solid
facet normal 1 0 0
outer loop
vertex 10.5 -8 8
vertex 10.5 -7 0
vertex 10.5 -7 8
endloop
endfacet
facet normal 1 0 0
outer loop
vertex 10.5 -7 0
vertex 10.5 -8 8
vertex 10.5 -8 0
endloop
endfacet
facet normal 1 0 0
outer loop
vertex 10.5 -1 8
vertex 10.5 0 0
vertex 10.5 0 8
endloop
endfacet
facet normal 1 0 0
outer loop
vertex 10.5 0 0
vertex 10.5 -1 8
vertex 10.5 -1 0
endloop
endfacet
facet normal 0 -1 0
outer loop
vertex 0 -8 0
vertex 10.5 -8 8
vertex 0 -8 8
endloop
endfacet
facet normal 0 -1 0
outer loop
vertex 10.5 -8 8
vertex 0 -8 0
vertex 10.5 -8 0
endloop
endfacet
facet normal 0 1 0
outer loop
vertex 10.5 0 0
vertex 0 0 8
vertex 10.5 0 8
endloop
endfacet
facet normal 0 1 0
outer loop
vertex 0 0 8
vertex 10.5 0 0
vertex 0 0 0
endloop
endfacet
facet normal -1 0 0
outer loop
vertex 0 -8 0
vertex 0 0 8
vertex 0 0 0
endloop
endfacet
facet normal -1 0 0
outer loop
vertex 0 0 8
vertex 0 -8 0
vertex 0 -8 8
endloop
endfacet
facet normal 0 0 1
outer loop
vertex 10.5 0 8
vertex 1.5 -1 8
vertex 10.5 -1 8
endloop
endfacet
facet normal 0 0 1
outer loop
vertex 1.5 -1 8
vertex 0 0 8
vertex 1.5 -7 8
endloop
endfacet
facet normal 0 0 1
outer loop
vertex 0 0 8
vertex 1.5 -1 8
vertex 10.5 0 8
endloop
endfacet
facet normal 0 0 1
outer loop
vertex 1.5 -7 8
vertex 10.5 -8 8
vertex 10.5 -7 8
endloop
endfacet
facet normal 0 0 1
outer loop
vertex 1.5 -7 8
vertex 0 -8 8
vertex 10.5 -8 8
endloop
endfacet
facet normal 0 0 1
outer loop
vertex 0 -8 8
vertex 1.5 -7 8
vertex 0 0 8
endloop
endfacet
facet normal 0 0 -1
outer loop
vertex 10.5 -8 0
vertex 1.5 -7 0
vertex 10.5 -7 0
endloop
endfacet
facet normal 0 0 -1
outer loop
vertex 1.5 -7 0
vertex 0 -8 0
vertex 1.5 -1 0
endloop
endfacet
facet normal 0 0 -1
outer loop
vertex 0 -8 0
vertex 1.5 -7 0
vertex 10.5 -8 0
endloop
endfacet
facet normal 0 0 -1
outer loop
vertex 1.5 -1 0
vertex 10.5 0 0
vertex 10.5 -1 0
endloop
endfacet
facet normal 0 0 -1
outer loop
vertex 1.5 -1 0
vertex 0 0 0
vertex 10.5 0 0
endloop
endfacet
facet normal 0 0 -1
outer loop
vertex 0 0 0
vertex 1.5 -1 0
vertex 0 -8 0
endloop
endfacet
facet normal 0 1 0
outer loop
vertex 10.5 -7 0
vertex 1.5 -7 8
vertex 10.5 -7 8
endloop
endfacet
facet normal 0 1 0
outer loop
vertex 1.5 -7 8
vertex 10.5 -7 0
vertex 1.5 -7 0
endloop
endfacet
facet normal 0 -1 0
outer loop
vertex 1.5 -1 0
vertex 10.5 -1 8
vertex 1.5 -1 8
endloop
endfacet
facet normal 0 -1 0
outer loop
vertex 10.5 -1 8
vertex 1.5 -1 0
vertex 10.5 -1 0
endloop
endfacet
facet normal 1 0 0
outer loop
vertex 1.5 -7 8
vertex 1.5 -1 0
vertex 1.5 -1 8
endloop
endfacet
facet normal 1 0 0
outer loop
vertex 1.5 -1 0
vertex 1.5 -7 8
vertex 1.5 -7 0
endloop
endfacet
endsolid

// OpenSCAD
rotate([90,0,0]) //causes z and y to switch! because of rotation beware
/*union(){

	difference(){
		resize([10.5,8,8])
		cube(2);
		translate([1.5,0,1])
		resize([7.5,8,8])
		cube(2);
	}//end difference
	translate([0,0,7])
	resize([2,8,1.15])
	cube(2);

	translate([8.3,0,7])
	resize([2,8,1.15])
	cube(2);
}//end union*/

//Iteration2
union(){

	difference(){
		resize([10.5,8,8])
		cube(2);
		//cutout cube
		translate([1.5,0,1])
		resize([9,8,6])
		cube(2);
	}



}//end union
